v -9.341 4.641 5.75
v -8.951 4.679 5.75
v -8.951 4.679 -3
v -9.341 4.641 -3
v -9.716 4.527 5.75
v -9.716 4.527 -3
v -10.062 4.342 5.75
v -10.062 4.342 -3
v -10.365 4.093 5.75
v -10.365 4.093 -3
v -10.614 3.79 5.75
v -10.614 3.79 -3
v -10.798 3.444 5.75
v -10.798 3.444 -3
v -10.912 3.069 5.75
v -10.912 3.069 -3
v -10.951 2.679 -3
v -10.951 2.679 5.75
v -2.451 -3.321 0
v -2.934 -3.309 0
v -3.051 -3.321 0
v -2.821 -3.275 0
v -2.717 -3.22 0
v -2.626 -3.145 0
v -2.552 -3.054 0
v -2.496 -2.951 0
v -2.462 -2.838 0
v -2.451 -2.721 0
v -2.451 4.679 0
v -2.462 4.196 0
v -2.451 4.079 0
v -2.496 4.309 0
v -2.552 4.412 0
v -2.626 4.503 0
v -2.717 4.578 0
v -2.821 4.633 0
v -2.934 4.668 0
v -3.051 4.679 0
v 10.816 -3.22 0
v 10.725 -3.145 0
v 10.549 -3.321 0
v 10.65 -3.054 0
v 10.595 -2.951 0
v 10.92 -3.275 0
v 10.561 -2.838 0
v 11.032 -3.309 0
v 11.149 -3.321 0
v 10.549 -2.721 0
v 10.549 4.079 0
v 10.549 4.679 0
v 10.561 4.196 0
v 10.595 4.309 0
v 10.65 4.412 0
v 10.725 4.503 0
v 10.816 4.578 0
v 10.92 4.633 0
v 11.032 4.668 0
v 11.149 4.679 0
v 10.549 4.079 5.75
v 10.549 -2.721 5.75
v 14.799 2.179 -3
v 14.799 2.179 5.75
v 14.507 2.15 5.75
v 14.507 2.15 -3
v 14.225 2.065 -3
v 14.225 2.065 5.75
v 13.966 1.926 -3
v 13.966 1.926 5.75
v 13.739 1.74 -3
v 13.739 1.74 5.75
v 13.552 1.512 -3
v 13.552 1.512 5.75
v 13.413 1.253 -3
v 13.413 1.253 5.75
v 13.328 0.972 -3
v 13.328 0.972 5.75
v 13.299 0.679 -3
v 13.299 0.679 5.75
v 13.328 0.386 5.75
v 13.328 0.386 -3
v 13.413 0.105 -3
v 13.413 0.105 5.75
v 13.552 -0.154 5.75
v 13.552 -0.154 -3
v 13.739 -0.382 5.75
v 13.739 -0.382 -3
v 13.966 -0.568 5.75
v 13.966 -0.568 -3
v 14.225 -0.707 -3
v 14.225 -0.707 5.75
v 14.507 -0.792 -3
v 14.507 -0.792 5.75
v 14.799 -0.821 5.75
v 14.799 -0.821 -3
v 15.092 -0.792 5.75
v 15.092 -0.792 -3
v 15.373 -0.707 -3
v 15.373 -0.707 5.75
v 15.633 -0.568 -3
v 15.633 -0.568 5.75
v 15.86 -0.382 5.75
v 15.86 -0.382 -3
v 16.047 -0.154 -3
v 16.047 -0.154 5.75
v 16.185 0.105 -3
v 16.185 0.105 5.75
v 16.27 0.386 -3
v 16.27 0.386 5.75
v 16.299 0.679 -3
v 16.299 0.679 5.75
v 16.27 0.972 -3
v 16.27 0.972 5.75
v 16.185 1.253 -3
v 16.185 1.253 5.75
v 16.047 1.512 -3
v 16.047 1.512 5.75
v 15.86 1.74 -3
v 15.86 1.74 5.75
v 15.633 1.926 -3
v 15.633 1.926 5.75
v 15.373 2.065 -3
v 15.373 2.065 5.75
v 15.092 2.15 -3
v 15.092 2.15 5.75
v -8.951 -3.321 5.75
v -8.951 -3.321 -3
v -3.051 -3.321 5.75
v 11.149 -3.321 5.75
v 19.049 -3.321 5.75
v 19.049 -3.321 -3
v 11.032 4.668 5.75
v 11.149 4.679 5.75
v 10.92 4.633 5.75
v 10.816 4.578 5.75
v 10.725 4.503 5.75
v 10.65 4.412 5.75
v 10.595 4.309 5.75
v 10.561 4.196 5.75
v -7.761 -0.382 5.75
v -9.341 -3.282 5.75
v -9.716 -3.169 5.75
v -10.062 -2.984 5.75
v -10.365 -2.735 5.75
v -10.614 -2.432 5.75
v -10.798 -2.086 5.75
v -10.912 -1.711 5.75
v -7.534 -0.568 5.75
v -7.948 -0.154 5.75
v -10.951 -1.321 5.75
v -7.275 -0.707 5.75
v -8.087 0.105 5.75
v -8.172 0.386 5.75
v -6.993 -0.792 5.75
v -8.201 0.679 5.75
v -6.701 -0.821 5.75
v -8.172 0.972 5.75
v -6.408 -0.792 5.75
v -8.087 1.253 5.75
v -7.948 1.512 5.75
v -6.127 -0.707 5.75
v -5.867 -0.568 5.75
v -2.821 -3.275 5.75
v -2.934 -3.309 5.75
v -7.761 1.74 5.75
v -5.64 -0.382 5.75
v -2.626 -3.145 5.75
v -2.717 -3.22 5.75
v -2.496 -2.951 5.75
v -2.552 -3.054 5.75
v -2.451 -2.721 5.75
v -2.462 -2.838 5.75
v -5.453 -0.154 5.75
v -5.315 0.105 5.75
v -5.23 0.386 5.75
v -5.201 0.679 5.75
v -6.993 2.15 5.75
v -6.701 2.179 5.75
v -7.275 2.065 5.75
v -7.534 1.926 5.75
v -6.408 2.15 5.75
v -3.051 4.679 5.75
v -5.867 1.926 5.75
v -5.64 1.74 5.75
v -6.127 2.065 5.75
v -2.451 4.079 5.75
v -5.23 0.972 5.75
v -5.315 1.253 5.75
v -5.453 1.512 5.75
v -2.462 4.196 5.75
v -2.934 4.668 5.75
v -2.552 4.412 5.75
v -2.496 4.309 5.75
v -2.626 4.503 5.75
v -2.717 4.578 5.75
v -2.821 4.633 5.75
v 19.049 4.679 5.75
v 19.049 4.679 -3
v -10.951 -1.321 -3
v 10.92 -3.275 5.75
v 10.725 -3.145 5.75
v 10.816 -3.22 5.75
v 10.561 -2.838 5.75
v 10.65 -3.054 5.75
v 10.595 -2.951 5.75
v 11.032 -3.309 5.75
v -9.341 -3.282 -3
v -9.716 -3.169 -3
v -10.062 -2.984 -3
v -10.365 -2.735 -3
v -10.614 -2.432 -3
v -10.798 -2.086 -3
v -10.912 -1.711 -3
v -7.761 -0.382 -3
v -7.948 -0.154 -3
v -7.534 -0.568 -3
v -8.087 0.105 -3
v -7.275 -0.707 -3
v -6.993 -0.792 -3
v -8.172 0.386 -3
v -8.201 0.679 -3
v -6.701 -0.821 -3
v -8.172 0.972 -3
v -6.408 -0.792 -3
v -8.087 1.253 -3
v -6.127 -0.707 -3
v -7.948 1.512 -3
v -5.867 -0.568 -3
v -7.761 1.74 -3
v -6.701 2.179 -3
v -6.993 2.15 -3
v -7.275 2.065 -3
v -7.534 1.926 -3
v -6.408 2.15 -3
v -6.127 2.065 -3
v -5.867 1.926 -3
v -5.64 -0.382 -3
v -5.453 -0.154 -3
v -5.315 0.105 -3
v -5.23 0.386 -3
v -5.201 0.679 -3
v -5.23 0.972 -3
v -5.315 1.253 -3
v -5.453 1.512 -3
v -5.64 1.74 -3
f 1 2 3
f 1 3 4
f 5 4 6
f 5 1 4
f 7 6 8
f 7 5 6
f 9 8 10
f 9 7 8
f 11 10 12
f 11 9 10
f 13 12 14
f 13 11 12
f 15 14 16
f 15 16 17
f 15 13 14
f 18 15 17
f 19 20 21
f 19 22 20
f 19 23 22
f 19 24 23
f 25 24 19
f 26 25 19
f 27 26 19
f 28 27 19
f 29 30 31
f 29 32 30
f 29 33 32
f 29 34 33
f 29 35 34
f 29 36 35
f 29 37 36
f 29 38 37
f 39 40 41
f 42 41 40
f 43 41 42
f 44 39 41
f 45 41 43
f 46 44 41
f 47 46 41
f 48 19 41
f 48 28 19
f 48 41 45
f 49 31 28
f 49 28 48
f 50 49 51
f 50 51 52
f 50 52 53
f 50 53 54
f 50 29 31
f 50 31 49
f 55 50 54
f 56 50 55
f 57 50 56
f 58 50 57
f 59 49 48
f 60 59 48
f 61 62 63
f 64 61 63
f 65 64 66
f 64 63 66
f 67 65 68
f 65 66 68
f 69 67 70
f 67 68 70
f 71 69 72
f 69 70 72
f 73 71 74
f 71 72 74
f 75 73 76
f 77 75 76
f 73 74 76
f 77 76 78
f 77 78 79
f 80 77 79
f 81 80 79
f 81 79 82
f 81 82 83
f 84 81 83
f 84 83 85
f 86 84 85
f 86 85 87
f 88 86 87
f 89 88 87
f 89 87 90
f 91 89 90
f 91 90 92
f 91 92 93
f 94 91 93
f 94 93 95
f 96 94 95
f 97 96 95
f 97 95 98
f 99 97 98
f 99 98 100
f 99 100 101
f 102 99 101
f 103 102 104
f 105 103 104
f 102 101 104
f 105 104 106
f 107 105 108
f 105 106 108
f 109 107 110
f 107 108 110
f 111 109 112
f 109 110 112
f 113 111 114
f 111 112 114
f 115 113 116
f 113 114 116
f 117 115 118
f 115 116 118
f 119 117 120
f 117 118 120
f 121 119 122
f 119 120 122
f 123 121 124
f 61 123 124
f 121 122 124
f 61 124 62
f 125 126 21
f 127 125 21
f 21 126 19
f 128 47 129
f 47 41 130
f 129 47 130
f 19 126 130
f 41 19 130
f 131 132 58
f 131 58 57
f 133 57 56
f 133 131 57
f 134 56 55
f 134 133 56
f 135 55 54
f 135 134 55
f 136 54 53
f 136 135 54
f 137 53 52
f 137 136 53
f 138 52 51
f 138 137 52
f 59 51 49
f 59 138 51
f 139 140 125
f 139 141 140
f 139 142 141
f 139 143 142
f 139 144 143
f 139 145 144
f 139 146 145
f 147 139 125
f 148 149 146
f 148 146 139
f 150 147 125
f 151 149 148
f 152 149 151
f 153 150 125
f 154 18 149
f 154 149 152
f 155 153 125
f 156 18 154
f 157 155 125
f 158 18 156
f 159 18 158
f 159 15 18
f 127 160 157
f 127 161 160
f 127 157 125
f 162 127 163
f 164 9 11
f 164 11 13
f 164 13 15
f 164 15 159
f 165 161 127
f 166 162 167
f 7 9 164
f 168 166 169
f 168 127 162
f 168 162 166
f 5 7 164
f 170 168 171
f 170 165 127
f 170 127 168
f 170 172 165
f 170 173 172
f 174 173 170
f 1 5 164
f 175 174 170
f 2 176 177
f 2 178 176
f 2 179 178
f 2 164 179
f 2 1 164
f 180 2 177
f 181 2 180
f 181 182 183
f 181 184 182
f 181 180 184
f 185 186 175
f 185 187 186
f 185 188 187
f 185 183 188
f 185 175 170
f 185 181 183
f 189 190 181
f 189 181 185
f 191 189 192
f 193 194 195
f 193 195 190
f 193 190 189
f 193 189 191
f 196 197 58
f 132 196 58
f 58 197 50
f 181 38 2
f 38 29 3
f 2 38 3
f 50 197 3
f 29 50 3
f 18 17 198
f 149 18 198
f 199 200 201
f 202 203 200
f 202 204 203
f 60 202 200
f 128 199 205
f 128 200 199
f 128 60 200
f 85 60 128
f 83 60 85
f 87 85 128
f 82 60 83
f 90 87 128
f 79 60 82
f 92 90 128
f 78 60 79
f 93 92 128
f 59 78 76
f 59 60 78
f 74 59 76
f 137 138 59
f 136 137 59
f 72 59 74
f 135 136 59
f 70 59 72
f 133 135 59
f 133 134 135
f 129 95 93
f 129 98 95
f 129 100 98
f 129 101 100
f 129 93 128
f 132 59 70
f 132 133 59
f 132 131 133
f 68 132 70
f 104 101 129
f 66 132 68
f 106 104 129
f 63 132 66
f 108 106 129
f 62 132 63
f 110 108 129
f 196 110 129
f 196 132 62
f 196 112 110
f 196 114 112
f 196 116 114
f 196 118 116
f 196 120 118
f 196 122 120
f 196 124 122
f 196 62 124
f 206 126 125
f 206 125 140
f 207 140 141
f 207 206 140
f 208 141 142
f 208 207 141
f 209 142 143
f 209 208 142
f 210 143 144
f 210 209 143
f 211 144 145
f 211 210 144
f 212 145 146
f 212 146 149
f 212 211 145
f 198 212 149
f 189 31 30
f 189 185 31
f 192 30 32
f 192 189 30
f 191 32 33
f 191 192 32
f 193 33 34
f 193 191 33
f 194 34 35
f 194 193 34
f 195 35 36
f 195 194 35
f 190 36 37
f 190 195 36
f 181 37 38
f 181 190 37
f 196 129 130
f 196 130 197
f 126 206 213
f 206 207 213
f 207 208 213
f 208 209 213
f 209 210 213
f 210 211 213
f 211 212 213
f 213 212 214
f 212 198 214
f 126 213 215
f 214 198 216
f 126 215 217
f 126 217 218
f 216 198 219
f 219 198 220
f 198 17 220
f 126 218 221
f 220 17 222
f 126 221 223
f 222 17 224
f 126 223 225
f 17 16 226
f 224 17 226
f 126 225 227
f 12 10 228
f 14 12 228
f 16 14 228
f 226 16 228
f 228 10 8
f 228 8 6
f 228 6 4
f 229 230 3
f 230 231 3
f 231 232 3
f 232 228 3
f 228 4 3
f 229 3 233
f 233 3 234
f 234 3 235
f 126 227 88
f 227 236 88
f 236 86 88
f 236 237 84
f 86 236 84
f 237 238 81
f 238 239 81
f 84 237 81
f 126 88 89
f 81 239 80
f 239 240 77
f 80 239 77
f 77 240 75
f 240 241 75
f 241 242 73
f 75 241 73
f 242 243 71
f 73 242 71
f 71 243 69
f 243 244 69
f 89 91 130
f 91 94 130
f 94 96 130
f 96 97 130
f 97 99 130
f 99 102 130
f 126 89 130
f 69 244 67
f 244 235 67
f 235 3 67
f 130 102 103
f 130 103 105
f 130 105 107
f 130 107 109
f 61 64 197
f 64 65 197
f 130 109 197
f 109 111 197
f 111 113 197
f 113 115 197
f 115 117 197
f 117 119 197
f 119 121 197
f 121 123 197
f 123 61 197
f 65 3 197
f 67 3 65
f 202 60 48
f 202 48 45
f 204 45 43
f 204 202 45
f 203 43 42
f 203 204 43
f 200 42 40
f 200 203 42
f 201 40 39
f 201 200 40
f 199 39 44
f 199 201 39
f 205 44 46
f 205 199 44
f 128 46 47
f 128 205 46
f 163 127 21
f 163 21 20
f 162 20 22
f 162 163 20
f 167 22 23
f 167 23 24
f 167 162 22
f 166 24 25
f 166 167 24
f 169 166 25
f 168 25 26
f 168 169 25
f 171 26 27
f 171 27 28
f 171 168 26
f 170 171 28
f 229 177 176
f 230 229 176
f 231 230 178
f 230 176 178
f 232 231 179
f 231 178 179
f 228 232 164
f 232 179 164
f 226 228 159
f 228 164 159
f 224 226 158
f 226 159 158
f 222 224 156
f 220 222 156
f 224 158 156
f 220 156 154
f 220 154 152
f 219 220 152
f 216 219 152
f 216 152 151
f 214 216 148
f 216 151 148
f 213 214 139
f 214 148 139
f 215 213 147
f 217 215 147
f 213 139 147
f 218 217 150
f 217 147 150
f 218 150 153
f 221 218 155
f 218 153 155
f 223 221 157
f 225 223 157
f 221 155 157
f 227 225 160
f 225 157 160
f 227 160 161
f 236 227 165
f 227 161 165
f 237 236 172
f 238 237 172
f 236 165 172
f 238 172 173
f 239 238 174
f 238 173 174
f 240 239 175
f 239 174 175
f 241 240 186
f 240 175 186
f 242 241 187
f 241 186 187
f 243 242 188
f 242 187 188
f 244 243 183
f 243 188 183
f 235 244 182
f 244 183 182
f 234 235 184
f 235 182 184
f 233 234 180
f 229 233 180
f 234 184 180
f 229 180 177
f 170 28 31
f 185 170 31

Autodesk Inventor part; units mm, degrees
ref_plane "YZ Plane" through (0, 0, 0) normal (1, 0, 0) x (0, 1, 0)
ref_plane "XZ Plane" through (0, 0, 0) normal (0, 1, 0) x (-1, 0, 0)
ref_plane "XY Plane" through (0, 0, 0) normal (0, 0, 1) x (1, 0, 0)
sketch "Sketch1" plane through (0, 0, 0) normal (0, 0, 1) x (1, 0, 0)
  line L0 (-2.4507, 4.6791) -> (10.5493, 4.6791)
  line L1 (10.5493, 4.6791) -> (10.5493, -3.3209)
  line L2 (10.5493, -3.3209) -> (-2.4507, -3.3209)
  line L3 (-2.4507, -3.3209) -> (-2.4507, 4.6791)
  line L4 (-2.4507, 4.6791) -> (-10.9507, 4.6791)
  line L5 (-10.9507, 4.6791) -> (-10.9507, -3.3209)
  line L6 (-10.9507, -3.3209) -> (-2.4507, -3.3209)
  line L7 (10.5493, -3.3209) -> (19.0493, -3.3209)
  line L8 (19.0493, -3.3209) -> (19.0493, 4.6791)
  line L9 (19.0493, 4.6791) -> (10.5493, 4.6791)
  point P0 (0, 0)
  point P1 (-6.7007, 0.6791)
  point P2 (14.7993, 0.6791)
  dimension "d0" = 13
  dimension "d1" = 8
  dimension "d2" = 8.5
  dimension "d3" = 8.5
  dimension "d4" = 30
  dimension "d5" = 4.25
  dimension "d6" = 4
  dimension "d7" = 4
  dimension "d8" = 4.25
extrude "Extrusion1" add sketch "Sketch1" along normal blind 5.75 contours L3 L6 L5 L4 | L9 L8 L7 L1
extrude "Extrusion2" add sketch "Sketch1" against normal blind 3
hole "Hole1" at (-6.7007, 0.6791, 0) at (14.7993, 0.6791, 0) direction (0, 0, 1) diameter 3 end through all both
fillet "Fillet1" radius 2 2 edges at (-10.9507, -3.3209, 1.375) (-10.9507, 4.6791, 1.375)
fillet "Fillet2" radius 0.6 4 edges at (10.5493, -3.3209, 2.875) (-2.4507, -3.3209, 2.875) (10.5493, 4.6791, 2.875) (-2.4507, 4.6791, 2.875)
equation "\"d3\" = d2"
equation "\"d5\" = 0.5 * d2"
equation "\"d6\" = 0.5 * d1"
equation "\"d7\" = d6"
equation "\"d8\" = d5"
properties part number "3DP_PLA_Y_axis_endstop_mount" material "ABS Plastic"
